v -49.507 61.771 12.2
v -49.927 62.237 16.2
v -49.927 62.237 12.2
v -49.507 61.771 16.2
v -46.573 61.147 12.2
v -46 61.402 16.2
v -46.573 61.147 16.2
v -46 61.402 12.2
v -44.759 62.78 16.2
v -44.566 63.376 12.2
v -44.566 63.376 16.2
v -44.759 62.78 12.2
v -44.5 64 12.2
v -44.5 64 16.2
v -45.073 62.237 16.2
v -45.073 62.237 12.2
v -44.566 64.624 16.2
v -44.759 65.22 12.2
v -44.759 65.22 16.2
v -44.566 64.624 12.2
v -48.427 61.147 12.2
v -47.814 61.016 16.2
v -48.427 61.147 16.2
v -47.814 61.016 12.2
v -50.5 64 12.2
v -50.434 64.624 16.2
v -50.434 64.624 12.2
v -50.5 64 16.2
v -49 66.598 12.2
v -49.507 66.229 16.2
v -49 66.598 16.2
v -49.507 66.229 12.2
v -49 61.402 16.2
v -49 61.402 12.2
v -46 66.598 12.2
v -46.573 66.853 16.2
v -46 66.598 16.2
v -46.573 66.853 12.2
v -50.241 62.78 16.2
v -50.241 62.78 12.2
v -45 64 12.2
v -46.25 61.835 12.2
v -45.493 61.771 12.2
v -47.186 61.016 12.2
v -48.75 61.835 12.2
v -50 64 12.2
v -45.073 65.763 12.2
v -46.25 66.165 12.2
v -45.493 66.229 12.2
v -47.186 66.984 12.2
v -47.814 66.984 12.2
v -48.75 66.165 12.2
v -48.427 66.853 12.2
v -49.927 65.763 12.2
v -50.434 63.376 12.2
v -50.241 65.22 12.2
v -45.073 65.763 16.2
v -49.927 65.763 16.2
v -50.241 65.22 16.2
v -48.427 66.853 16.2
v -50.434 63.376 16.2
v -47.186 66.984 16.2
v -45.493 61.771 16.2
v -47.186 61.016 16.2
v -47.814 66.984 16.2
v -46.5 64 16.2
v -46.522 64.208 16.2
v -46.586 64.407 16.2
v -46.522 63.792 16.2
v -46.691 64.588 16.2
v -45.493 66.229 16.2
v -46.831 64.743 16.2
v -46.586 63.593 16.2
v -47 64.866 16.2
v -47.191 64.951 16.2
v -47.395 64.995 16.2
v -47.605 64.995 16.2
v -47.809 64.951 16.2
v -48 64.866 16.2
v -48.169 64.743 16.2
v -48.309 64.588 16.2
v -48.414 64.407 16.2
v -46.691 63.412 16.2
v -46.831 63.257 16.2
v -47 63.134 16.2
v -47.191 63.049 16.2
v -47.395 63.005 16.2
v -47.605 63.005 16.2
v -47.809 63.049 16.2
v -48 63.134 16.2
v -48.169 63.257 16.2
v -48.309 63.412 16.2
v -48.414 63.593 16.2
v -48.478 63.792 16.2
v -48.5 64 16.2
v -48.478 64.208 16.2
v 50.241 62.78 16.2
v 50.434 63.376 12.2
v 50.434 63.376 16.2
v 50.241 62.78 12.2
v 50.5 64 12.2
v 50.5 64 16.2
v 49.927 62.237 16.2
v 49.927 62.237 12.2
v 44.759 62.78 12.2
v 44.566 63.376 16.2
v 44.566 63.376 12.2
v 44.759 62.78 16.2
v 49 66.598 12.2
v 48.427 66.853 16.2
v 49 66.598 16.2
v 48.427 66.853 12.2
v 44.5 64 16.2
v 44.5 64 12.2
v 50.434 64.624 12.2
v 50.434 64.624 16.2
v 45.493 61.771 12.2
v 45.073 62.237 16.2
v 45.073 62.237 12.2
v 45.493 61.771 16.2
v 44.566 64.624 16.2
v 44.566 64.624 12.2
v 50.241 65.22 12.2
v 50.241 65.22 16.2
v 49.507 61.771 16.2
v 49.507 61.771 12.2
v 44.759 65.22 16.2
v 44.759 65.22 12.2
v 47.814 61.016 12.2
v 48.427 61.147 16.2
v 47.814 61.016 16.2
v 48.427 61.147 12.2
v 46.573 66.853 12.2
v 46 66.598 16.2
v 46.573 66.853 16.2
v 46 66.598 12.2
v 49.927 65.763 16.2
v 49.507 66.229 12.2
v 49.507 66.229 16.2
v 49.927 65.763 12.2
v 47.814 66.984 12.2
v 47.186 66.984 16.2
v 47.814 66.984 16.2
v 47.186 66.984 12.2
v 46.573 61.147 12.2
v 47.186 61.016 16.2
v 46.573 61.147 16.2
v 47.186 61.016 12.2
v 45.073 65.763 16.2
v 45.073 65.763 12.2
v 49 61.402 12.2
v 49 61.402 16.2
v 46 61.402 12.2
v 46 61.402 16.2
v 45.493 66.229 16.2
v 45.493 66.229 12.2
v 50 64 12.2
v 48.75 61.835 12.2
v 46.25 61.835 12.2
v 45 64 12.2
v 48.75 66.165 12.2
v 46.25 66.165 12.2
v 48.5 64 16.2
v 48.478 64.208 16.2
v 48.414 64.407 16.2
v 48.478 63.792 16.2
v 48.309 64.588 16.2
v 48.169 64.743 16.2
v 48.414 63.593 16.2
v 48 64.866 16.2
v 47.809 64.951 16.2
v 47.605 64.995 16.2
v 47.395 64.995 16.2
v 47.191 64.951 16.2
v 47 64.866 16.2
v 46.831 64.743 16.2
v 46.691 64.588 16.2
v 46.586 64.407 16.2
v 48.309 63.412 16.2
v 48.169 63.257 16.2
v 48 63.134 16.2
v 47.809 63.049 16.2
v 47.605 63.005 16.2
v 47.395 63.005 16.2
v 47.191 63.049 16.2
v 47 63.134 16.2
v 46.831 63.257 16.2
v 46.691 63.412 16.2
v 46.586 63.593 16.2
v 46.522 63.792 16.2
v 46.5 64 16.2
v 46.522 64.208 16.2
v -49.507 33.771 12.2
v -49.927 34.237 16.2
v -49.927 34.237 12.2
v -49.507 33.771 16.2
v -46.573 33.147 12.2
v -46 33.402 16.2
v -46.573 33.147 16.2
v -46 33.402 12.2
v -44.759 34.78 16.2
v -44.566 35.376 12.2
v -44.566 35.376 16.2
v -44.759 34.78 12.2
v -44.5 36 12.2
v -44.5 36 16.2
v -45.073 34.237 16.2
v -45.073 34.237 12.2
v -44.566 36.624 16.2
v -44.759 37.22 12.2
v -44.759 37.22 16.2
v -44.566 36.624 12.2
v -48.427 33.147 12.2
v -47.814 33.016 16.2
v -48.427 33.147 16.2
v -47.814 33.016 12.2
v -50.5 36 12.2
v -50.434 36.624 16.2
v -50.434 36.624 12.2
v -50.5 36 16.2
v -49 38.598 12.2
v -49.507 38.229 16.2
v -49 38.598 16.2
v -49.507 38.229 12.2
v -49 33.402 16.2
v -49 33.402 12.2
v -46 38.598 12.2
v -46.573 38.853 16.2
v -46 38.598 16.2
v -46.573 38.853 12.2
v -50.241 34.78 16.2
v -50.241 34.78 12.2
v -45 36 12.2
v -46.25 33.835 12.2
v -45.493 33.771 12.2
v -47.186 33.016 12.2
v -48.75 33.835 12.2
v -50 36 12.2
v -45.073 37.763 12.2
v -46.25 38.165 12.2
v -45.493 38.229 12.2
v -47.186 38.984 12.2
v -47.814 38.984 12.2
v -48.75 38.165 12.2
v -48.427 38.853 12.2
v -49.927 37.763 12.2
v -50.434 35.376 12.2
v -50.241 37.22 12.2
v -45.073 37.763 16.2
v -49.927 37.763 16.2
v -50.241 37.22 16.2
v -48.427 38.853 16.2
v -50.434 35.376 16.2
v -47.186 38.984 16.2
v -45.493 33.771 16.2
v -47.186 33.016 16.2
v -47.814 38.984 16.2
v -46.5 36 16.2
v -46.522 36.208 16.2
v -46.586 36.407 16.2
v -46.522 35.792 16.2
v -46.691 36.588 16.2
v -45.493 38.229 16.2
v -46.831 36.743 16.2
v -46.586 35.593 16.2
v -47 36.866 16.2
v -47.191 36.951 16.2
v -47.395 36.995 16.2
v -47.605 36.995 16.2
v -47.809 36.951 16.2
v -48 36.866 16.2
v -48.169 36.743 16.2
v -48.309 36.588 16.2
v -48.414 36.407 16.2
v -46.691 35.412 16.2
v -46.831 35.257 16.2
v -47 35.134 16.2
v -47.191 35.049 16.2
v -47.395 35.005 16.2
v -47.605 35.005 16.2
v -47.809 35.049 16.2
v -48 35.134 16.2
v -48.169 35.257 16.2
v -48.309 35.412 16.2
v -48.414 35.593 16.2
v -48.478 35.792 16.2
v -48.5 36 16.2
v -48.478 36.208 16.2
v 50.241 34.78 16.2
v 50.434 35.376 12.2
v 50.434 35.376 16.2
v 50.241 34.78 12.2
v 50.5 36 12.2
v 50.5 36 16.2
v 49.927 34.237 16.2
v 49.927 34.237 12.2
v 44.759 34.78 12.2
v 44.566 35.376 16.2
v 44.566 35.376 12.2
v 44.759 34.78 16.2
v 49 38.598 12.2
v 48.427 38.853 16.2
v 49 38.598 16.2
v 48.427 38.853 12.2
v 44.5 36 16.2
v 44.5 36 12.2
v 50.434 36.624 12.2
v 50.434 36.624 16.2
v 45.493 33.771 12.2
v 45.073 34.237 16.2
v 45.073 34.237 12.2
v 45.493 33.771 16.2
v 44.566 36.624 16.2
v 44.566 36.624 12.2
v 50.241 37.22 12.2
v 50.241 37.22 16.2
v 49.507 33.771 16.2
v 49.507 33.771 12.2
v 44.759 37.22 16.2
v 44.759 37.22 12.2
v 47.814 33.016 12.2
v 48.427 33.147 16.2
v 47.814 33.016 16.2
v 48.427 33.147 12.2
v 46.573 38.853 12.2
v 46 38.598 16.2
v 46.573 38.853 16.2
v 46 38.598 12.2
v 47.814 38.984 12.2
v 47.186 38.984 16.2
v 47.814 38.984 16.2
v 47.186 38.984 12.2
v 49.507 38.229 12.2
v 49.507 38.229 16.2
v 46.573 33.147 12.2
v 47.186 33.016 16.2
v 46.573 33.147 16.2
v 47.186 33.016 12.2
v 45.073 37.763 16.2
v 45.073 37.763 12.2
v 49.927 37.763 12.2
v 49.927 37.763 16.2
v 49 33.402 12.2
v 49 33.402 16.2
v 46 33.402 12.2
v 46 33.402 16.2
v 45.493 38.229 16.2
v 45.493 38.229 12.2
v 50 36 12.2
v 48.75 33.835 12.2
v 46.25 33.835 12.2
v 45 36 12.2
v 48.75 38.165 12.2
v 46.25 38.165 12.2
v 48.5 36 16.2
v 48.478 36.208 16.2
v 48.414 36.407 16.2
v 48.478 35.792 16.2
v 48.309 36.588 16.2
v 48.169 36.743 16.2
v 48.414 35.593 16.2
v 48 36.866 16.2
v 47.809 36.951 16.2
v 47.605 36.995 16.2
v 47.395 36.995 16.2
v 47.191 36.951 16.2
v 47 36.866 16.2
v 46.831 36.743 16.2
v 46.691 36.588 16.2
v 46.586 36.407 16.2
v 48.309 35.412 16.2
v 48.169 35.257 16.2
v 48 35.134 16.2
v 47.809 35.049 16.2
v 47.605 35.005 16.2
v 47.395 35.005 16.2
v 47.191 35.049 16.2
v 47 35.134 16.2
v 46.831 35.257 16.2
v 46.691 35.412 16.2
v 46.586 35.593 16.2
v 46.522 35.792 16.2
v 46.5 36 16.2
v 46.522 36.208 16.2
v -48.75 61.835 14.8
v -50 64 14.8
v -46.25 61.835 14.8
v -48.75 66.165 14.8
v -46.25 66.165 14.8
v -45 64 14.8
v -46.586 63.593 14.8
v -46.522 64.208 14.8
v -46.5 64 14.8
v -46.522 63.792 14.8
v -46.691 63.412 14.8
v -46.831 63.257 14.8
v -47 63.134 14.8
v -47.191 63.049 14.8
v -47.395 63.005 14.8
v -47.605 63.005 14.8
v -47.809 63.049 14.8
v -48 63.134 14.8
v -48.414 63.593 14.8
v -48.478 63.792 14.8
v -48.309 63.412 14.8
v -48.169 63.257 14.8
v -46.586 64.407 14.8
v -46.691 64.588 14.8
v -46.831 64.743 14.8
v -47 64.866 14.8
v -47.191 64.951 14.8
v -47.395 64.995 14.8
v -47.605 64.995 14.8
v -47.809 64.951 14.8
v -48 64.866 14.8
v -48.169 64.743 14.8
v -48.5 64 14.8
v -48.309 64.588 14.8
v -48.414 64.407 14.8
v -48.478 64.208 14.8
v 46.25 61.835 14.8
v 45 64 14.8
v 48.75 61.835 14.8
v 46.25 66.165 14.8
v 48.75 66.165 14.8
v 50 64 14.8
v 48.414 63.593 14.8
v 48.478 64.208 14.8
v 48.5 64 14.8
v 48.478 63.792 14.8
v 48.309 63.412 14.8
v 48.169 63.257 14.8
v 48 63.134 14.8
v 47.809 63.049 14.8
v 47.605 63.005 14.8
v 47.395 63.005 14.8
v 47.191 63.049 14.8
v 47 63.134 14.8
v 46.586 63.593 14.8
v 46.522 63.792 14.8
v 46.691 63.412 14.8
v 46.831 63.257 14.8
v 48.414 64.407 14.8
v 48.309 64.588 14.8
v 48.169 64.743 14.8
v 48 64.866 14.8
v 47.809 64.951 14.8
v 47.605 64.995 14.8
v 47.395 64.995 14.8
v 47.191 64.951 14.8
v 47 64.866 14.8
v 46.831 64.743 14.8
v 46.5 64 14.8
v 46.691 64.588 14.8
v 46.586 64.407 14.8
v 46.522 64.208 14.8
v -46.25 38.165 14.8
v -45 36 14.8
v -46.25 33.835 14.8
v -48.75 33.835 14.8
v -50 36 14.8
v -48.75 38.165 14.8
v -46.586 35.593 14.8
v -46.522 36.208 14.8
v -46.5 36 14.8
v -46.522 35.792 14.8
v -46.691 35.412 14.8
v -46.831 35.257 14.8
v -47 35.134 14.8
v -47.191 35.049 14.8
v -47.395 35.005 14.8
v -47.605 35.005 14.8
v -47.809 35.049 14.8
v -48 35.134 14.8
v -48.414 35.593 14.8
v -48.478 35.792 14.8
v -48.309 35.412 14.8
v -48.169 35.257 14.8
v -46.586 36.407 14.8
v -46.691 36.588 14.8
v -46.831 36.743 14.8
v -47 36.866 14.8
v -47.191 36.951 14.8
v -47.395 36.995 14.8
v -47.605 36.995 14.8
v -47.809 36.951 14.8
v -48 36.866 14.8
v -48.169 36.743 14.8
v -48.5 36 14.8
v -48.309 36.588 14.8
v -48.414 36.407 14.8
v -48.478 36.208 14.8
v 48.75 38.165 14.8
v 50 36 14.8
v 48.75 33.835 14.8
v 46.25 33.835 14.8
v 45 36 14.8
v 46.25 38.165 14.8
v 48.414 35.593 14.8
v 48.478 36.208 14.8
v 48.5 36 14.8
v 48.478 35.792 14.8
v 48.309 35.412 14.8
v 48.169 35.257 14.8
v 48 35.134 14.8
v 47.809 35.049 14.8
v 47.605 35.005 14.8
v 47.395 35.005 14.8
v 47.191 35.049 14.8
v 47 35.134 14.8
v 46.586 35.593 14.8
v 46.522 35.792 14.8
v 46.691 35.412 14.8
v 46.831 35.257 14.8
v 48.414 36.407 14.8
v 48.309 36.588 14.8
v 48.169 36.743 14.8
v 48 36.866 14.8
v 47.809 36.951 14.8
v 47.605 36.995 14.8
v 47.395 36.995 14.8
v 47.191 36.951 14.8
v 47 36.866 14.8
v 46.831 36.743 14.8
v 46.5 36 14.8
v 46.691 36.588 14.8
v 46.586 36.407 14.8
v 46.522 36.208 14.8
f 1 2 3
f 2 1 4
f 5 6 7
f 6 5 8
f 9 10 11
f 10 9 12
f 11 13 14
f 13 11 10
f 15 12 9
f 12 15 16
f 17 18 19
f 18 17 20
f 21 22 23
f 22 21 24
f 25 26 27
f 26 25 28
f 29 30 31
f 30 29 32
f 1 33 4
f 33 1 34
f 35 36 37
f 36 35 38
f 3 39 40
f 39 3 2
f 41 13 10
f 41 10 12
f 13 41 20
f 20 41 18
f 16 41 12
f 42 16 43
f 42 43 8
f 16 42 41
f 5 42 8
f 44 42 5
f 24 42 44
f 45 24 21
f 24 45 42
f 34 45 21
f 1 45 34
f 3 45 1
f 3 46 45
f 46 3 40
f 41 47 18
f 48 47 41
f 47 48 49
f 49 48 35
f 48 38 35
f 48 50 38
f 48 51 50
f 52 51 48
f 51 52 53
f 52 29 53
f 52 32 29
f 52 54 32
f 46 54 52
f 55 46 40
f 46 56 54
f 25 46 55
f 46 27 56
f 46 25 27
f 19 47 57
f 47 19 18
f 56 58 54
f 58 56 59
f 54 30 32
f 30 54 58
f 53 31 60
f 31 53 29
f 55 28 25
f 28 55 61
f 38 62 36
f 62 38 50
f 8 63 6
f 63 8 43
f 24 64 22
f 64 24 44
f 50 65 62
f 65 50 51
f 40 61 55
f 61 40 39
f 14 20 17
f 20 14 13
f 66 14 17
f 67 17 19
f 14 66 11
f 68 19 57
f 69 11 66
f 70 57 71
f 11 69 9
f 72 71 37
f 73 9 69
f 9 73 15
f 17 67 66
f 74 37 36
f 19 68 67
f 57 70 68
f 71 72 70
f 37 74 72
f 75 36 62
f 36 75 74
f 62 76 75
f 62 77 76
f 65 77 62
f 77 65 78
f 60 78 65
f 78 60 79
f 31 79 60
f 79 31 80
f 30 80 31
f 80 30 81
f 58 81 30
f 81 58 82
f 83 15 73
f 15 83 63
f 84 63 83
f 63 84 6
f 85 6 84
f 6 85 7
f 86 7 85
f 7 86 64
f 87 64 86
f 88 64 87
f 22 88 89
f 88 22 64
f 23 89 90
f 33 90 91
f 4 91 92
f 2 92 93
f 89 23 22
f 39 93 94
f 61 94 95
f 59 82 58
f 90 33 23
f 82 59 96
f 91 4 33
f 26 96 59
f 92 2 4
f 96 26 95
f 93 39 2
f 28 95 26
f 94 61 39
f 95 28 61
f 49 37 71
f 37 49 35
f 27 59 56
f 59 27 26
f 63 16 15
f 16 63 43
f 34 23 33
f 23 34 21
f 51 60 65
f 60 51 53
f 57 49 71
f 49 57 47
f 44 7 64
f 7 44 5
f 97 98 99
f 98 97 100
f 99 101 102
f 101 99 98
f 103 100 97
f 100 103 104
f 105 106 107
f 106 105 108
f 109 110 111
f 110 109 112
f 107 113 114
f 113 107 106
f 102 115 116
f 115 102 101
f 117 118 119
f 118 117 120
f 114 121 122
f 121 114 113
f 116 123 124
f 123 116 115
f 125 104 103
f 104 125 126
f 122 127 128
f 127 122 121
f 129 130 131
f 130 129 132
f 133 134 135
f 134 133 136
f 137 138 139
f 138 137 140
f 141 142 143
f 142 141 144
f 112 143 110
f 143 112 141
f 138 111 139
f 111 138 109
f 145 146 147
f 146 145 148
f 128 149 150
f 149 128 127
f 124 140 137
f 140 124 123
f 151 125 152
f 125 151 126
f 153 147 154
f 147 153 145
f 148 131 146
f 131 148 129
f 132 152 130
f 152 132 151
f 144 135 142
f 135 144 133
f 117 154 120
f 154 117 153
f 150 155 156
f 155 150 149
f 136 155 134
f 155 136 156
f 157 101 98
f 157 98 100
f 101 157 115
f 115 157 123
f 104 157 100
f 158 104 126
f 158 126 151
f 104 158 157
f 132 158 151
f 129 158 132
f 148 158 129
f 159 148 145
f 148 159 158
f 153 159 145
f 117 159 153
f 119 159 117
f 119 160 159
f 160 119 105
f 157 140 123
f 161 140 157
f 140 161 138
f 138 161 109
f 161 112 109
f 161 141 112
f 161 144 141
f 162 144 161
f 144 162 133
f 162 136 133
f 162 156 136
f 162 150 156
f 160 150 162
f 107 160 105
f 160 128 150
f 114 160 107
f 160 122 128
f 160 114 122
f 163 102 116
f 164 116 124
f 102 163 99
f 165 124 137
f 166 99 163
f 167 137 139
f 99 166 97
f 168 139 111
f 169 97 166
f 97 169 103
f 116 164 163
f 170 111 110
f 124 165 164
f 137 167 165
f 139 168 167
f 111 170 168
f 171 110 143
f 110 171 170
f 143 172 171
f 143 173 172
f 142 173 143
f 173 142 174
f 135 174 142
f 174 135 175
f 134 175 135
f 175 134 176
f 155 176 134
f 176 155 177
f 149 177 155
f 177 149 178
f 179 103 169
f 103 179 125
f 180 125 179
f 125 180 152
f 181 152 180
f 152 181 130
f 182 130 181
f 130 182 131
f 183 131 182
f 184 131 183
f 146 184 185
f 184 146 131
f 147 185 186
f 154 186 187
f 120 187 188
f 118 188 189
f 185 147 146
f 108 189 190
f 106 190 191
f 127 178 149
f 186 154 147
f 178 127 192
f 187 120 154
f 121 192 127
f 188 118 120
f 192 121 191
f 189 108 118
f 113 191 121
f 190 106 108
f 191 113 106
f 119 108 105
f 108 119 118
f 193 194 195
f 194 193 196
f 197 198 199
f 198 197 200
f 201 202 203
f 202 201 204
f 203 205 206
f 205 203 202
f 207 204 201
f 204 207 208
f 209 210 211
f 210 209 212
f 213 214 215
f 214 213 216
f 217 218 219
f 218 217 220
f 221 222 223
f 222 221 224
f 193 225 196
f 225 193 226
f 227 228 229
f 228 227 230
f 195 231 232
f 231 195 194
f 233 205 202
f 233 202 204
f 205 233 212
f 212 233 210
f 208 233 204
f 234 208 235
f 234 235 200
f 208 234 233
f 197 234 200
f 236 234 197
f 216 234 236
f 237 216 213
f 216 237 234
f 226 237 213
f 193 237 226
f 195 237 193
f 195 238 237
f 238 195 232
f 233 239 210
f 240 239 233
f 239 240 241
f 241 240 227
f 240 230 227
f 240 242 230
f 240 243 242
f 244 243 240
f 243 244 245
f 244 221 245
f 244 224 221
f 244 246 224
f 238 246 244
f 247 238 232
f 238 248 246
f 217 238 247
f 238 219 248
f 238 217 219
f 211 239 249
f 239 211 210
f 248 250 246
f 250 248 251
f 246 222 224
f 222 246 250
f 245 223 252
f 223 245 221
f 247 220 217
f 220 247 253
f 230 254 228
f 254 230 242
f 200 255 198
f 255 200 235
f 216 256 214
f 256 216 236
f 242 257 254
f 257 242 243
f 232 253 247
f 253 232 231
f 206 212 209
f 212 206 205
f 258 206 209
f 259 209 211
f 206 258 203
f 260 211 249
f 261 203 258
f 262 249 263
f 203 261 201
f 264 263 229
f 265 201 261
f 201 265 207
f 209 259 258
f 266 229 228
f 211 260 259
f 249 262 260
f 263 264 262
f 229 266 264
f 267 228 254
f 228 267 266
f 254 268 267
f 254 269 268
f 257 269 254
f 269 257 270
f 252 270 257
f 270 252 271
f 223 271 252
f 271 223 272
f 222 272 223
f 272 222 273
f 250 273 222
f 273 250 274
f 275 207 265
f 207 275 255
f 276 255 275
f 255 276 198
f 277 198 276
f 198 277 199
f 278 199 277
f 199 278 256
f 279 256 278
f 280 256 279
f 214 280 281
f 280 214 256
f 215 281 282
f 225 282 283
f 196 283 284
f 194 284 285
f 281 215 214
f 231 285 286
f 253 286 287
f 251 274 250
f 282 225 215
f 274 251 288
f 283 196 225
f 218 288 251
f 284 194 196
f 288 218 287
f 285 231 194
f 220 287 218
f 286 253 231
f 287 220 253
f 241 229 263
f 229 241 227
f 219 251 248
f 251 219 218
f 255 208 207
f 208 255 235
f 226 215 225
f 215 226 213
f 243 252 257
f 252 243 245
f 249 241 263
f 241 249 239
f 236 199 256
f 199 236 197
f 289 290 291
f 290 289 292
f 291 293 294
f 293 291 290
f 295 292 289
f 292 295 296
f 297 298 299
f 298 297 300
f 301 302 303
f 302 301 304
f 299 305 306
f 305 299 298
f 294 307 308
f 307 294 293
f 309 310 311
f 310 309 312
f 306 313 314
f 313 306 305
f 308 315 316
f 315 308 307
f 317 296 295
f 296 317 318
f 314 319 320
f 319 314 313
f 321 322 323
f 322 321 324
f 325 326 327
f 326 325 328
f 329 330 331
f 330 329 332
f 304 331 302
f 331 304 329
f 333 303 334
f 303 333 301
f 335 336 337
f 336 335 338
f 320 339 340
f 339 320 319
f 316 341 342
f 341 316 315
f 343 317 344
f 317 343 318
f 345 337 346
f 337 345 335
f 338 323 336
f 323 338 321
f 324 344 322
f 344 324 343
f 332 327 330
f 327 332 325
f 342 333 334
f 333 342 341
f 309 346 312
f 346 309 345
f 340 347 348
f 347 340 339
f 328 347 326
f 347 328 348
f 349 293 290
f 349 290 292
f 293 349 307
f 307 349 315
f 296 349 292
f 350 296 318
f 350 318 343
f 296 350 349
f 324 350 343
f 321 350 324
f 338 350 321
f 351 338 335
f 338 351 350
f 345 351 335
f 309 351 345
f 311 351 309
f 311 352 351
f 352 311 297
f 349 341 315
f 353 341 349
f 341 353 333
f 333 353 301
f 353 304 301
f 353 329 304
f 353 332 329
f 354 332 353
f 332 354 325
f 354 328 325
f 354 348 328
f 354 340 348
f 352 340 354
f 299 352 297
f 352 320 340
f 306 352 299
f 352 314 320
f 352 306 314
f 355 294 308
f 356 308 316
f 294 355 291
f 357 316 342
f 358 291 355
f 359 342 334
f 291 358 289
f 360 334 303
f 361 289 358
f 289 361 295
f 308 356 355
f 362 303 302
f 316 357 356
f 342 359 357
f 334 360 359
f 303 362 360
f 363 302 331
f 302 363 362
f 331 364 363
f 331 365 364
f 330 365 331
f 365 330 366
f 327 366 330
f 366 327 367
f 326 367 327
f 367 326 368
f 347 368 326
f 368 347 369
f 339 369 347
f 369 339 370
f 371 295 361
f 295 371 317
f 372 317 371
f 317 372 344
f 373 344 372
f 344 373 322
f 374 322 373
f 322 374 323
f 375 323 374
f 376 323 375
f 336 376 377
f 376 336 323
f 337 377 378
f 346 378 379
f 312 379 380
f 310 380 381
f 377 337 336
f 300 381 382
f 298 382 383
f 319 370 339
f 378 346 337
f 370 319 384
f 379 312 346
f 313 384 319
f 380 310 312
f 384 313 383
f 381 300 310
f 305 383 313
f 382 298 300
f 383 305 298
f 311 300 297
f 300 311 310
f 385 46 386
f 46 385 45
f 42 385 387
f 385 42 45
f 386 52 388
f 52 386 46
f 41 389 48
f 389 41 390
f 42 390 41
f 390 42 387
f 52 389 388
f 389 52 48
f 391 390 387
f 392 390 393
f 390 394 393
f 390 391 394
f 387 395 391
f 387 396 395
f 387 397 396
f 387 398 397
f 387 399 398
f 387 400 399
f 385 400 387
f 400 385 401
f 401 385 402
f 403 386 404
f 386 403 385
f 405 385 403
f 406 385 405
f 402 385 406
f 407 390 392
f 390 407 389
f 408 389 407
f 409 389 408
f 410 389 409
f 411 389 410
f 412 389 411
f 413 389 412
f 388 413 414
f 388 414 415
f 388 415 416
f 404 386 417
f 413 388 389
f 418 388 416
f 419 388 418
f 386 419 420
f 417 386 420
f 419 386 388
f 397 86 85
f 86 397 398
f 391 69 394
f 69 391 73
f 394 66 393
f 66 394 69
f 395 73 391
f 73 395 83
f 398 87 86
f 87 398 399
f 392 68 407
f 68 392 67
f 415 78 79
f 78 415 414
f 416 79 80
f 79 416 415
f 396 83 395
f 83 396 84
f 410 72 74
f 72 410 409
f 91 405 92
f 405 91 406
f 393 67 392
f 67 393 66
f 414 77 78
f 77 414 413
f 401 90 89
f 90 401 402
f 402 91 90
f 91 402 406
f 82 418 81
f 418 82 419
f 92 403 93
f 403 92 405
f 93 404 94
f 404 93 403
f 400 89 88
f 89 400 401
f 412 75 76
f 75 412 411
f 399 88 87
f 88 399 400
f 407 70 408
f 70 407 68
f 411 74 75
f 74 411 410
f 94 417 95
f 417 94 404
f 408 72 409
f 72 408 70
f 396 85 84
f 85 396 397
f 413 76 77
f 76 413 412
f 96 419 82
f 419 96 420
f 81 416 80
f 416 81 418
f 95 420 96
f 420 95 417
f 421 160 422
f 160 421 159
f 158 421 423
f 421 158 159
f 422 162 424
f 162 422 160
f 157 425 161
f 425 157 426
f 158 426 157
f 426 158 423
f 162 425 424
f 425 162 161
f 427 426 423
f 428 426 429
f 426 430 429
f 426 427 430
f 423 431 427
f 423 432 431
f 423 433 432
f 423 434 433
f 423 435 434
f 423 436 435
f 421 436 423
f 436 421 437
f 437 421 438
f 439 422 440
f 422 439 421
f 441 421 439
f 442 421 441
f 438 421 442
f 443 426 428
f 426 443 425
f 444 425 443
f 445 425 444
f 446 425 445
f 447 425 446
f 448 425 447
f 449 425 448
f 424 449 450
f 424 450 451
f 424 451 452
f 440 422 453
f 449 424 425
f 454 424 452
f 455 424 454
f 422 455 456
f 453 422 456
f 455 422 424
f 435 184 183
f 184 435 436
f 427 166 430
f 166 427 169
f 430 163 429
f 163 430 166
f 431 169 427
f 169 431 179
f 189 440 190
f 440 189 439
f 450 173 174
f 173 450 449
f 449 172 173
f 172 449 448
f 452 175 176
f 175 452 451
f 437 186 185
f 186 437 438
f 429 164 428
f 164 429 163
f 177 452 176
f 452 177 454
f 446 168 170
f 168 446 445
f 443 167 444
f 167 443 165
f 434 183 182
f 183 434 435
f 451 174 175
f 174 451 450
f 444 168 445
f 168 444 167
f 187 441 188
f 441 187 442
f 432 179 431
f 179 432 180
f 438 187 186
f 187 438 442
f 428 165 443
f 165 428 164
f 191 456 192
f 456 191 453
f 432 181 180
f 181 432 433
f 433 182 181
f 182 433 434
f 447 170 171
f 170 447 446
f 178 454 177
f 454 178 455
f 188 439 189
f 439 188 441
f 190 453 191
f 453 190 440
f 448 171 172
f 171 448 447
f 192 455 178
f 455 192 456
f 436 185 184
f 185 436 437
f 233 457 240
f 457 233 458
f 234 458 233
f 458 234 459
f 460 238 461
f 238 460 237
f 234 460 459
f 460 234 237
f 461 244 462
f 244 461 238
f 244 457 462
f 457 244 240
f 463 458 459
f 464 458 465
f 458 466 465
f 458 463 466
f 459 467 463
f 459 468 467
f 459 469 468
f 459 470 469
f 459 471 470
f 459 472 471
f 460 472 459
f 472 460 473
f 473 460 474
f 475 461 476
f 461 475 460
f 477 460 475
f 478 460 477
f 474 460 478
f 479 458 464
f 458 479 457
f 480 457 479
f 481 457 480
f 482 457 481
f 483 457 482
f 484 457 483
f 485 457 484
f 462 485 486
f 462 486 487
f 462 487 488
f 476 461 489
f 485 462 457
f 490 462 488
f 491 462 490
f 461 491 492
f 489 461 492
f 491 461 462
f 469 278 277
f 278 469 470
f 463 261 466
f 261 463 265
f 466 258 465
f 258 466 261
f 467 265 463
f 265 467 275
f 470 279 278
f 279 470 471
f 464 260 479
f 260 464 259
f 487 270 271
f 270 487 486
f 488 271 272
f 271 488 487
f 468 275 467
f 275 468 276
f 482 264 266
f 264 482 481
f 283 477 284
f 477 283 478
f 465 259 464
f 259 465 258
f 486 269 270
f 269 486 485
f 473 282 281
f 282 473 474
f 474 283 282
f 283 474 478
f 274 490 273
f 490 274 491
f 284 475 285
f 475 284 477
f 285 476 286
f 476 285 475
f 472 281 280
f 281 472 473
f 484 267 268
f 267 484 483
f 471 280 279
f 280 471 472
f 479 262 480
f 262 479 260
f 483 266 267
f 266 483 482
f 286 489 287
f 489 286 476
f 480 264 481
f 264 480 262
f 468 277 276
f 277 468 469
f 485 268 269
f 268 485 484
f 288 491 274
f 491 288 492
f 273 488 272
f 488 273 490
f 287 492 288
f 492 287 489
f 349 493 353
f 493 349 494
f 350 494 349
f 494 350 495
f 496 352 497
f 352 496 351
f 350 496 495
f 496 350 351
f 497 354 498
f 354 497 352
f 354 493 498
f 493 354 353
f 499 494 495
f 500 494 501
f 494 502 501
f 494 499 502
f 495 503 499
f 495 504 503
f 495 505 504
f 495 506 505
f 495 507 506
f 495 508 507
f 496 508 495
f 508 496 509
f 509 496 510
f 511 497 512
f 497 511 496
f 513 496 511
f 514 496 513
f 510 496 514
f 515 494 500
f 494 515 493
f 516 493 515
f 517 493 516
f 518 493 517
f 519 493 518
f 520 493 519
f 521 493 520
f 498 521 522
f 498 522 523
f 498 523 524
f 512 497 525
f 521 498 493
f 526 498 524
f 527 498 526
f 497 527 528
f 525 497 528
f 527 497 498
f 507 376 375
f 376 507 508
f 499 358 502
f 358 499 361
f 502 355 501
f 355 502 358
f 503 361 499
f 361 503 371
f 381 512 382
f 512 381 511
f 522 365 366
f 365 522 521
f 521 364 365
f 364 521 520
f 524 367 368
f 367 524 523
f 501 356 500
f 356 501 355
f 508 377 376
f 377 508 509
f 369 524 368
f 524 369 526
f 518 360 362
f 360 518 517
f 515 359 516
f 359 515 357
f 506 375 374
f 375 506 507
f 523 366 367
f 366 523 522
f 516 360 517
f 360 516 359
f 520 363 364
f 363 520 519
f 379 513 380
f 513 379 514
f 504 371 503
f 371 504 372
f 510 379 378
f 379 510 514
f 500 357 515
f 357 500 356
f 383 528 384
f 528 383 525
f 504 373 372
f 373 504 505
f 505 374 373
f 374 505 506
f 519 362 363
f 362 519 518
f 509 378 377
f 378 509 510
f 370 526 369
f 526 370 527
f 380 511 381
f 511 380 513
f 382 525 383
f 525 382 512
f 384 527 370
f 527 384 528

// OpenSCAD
$fs = 0.1;

bolt_centres = [
	[-47.5, -14.0, 0],
	[ 47.5, -14.0, 0],
	[-47.5,  14.0, 0],
	[ 47.5,  14.0, 0],
];

led_centres = [
	[-33, -11.4, 0],
	[ -3, -3, 0],
];

board_t = 1.6;
module board() {
	translate([0, 0, -(0)]) {
		translate([0, 0, -20]) linear_extrude(height=20) import("board.dxf", layer="battholder");
	}
	linear_extrude(height=board_t) import("board.dxf", layer="outline");
	translate([0, 0, board_t]) {
		linear_extrude(height=3.6) import("board.dxf", layer="wifi_ant");
		linear_extrude(height=2.7) import("board.dxf", layer="usb");
		linear_extrude(height=2) import("board.dxf", layer="buttons");
	}
}

module bottom() {
	difference() {
		union() {
			translate([0, 0, -(/*board_t +*/ 4)]) linear_extrude(height=4) import("board.dxf", layer="case_bottom_wall_pads");
			translate([0, 0, 0]) linear_extrude(height=3) import("board.dxf", layer="case_bottom_wall");
			translate([0, 0, 3]) linear_extrude(height=1) import("board.dxf", layer="case_bottom_lip");
			difference() {
				translate([0, 0, -5.5]) linear_extrude(height=1.6) import("board.dxf", layer="case_outline");
				for (b = led_centres) {
					translate(b + [0, 0, -(5.5) + 10.3]) sphere(r = 10);
				}
			}
		}

		union() {
			for (b = bolt_centres) {
				translate(b + [0, 0, -(5.6)]) cylinder(r = 2.4, h = 4.0);
				translate(b + [0, 0, -(5.6)]) cylinder(r = 1, h = 14.0);
			}

			rotate([180, 0, 0]) intersection() {
				union() {
					translate([0, 0, -(3) + 1]) linear_extrude(height=6) import("board.dxf", layer="btn_outer_sub");
					translate([0, 0, -(3) + 1]) linear_extrude(height=6) import("board.dxf", layer="btn_inner_sub");
				}
				translate([0, 0, 1]) rotate([0, -90, 0]) translate([0, 0, -10]) linear_extrude(height=50) import("board.dxf", layer="btn_ortho");
			}
			rotate([180, 0, 0]) translate([0, 0, 0]) {
				translate([0, 4, 0]) linear_extrude(height=2.7) import("board.dxf", layer="usb");
			}
		}
	}

	for (i = [0:2]) {
		translate([-27.3 + (9.5 * i), -19.2, -(1)]) rotate([90, 0, 0]) rotate_extrude() import("board.dxf", layer="button_nubbin");
	}
}

module top() {
	difference() {
		union() {
			translate([0, 0, 3]) linear_extrude(height=1) import("board.dxf", layer="case_top_lip");
			translate([0, 0, 3 + 1]) linear_extrude(height=22-4) import("board.dxf", layer="case_top_wall");
			translate([0, 0, 22]) linear_extrude(height=1.6) import("board.dxf", layer="case_outline");

			for (b = bolt_centres) {
				translate(b + [0, 0, board_t + 0.2]) cylinder(r = 3, h = 4.0);
			}
		}

		union() {
			for (b = bolt_centres) {
				translate(b + [0, 0, board_t + 1.6]) rotate([0, 0, 60]) cylinder(r = 2.5, h = 140, $fn=6);
				translate(b + [0, 0, 0]) cylinder(r = 1, h = 140);
			}

			translate([-39.5, 15, 12]) rotate([-90, 0, 0]) cylinder(r = 3.5, h = 10);
		}
	}
}

bottom();
translate([0, 50, 14]) rotate([180, 0, 0]) translate([0, 0, -4]) top();

//translate([0, 0, board_t]) rotate([180, 0, 0]) board();
